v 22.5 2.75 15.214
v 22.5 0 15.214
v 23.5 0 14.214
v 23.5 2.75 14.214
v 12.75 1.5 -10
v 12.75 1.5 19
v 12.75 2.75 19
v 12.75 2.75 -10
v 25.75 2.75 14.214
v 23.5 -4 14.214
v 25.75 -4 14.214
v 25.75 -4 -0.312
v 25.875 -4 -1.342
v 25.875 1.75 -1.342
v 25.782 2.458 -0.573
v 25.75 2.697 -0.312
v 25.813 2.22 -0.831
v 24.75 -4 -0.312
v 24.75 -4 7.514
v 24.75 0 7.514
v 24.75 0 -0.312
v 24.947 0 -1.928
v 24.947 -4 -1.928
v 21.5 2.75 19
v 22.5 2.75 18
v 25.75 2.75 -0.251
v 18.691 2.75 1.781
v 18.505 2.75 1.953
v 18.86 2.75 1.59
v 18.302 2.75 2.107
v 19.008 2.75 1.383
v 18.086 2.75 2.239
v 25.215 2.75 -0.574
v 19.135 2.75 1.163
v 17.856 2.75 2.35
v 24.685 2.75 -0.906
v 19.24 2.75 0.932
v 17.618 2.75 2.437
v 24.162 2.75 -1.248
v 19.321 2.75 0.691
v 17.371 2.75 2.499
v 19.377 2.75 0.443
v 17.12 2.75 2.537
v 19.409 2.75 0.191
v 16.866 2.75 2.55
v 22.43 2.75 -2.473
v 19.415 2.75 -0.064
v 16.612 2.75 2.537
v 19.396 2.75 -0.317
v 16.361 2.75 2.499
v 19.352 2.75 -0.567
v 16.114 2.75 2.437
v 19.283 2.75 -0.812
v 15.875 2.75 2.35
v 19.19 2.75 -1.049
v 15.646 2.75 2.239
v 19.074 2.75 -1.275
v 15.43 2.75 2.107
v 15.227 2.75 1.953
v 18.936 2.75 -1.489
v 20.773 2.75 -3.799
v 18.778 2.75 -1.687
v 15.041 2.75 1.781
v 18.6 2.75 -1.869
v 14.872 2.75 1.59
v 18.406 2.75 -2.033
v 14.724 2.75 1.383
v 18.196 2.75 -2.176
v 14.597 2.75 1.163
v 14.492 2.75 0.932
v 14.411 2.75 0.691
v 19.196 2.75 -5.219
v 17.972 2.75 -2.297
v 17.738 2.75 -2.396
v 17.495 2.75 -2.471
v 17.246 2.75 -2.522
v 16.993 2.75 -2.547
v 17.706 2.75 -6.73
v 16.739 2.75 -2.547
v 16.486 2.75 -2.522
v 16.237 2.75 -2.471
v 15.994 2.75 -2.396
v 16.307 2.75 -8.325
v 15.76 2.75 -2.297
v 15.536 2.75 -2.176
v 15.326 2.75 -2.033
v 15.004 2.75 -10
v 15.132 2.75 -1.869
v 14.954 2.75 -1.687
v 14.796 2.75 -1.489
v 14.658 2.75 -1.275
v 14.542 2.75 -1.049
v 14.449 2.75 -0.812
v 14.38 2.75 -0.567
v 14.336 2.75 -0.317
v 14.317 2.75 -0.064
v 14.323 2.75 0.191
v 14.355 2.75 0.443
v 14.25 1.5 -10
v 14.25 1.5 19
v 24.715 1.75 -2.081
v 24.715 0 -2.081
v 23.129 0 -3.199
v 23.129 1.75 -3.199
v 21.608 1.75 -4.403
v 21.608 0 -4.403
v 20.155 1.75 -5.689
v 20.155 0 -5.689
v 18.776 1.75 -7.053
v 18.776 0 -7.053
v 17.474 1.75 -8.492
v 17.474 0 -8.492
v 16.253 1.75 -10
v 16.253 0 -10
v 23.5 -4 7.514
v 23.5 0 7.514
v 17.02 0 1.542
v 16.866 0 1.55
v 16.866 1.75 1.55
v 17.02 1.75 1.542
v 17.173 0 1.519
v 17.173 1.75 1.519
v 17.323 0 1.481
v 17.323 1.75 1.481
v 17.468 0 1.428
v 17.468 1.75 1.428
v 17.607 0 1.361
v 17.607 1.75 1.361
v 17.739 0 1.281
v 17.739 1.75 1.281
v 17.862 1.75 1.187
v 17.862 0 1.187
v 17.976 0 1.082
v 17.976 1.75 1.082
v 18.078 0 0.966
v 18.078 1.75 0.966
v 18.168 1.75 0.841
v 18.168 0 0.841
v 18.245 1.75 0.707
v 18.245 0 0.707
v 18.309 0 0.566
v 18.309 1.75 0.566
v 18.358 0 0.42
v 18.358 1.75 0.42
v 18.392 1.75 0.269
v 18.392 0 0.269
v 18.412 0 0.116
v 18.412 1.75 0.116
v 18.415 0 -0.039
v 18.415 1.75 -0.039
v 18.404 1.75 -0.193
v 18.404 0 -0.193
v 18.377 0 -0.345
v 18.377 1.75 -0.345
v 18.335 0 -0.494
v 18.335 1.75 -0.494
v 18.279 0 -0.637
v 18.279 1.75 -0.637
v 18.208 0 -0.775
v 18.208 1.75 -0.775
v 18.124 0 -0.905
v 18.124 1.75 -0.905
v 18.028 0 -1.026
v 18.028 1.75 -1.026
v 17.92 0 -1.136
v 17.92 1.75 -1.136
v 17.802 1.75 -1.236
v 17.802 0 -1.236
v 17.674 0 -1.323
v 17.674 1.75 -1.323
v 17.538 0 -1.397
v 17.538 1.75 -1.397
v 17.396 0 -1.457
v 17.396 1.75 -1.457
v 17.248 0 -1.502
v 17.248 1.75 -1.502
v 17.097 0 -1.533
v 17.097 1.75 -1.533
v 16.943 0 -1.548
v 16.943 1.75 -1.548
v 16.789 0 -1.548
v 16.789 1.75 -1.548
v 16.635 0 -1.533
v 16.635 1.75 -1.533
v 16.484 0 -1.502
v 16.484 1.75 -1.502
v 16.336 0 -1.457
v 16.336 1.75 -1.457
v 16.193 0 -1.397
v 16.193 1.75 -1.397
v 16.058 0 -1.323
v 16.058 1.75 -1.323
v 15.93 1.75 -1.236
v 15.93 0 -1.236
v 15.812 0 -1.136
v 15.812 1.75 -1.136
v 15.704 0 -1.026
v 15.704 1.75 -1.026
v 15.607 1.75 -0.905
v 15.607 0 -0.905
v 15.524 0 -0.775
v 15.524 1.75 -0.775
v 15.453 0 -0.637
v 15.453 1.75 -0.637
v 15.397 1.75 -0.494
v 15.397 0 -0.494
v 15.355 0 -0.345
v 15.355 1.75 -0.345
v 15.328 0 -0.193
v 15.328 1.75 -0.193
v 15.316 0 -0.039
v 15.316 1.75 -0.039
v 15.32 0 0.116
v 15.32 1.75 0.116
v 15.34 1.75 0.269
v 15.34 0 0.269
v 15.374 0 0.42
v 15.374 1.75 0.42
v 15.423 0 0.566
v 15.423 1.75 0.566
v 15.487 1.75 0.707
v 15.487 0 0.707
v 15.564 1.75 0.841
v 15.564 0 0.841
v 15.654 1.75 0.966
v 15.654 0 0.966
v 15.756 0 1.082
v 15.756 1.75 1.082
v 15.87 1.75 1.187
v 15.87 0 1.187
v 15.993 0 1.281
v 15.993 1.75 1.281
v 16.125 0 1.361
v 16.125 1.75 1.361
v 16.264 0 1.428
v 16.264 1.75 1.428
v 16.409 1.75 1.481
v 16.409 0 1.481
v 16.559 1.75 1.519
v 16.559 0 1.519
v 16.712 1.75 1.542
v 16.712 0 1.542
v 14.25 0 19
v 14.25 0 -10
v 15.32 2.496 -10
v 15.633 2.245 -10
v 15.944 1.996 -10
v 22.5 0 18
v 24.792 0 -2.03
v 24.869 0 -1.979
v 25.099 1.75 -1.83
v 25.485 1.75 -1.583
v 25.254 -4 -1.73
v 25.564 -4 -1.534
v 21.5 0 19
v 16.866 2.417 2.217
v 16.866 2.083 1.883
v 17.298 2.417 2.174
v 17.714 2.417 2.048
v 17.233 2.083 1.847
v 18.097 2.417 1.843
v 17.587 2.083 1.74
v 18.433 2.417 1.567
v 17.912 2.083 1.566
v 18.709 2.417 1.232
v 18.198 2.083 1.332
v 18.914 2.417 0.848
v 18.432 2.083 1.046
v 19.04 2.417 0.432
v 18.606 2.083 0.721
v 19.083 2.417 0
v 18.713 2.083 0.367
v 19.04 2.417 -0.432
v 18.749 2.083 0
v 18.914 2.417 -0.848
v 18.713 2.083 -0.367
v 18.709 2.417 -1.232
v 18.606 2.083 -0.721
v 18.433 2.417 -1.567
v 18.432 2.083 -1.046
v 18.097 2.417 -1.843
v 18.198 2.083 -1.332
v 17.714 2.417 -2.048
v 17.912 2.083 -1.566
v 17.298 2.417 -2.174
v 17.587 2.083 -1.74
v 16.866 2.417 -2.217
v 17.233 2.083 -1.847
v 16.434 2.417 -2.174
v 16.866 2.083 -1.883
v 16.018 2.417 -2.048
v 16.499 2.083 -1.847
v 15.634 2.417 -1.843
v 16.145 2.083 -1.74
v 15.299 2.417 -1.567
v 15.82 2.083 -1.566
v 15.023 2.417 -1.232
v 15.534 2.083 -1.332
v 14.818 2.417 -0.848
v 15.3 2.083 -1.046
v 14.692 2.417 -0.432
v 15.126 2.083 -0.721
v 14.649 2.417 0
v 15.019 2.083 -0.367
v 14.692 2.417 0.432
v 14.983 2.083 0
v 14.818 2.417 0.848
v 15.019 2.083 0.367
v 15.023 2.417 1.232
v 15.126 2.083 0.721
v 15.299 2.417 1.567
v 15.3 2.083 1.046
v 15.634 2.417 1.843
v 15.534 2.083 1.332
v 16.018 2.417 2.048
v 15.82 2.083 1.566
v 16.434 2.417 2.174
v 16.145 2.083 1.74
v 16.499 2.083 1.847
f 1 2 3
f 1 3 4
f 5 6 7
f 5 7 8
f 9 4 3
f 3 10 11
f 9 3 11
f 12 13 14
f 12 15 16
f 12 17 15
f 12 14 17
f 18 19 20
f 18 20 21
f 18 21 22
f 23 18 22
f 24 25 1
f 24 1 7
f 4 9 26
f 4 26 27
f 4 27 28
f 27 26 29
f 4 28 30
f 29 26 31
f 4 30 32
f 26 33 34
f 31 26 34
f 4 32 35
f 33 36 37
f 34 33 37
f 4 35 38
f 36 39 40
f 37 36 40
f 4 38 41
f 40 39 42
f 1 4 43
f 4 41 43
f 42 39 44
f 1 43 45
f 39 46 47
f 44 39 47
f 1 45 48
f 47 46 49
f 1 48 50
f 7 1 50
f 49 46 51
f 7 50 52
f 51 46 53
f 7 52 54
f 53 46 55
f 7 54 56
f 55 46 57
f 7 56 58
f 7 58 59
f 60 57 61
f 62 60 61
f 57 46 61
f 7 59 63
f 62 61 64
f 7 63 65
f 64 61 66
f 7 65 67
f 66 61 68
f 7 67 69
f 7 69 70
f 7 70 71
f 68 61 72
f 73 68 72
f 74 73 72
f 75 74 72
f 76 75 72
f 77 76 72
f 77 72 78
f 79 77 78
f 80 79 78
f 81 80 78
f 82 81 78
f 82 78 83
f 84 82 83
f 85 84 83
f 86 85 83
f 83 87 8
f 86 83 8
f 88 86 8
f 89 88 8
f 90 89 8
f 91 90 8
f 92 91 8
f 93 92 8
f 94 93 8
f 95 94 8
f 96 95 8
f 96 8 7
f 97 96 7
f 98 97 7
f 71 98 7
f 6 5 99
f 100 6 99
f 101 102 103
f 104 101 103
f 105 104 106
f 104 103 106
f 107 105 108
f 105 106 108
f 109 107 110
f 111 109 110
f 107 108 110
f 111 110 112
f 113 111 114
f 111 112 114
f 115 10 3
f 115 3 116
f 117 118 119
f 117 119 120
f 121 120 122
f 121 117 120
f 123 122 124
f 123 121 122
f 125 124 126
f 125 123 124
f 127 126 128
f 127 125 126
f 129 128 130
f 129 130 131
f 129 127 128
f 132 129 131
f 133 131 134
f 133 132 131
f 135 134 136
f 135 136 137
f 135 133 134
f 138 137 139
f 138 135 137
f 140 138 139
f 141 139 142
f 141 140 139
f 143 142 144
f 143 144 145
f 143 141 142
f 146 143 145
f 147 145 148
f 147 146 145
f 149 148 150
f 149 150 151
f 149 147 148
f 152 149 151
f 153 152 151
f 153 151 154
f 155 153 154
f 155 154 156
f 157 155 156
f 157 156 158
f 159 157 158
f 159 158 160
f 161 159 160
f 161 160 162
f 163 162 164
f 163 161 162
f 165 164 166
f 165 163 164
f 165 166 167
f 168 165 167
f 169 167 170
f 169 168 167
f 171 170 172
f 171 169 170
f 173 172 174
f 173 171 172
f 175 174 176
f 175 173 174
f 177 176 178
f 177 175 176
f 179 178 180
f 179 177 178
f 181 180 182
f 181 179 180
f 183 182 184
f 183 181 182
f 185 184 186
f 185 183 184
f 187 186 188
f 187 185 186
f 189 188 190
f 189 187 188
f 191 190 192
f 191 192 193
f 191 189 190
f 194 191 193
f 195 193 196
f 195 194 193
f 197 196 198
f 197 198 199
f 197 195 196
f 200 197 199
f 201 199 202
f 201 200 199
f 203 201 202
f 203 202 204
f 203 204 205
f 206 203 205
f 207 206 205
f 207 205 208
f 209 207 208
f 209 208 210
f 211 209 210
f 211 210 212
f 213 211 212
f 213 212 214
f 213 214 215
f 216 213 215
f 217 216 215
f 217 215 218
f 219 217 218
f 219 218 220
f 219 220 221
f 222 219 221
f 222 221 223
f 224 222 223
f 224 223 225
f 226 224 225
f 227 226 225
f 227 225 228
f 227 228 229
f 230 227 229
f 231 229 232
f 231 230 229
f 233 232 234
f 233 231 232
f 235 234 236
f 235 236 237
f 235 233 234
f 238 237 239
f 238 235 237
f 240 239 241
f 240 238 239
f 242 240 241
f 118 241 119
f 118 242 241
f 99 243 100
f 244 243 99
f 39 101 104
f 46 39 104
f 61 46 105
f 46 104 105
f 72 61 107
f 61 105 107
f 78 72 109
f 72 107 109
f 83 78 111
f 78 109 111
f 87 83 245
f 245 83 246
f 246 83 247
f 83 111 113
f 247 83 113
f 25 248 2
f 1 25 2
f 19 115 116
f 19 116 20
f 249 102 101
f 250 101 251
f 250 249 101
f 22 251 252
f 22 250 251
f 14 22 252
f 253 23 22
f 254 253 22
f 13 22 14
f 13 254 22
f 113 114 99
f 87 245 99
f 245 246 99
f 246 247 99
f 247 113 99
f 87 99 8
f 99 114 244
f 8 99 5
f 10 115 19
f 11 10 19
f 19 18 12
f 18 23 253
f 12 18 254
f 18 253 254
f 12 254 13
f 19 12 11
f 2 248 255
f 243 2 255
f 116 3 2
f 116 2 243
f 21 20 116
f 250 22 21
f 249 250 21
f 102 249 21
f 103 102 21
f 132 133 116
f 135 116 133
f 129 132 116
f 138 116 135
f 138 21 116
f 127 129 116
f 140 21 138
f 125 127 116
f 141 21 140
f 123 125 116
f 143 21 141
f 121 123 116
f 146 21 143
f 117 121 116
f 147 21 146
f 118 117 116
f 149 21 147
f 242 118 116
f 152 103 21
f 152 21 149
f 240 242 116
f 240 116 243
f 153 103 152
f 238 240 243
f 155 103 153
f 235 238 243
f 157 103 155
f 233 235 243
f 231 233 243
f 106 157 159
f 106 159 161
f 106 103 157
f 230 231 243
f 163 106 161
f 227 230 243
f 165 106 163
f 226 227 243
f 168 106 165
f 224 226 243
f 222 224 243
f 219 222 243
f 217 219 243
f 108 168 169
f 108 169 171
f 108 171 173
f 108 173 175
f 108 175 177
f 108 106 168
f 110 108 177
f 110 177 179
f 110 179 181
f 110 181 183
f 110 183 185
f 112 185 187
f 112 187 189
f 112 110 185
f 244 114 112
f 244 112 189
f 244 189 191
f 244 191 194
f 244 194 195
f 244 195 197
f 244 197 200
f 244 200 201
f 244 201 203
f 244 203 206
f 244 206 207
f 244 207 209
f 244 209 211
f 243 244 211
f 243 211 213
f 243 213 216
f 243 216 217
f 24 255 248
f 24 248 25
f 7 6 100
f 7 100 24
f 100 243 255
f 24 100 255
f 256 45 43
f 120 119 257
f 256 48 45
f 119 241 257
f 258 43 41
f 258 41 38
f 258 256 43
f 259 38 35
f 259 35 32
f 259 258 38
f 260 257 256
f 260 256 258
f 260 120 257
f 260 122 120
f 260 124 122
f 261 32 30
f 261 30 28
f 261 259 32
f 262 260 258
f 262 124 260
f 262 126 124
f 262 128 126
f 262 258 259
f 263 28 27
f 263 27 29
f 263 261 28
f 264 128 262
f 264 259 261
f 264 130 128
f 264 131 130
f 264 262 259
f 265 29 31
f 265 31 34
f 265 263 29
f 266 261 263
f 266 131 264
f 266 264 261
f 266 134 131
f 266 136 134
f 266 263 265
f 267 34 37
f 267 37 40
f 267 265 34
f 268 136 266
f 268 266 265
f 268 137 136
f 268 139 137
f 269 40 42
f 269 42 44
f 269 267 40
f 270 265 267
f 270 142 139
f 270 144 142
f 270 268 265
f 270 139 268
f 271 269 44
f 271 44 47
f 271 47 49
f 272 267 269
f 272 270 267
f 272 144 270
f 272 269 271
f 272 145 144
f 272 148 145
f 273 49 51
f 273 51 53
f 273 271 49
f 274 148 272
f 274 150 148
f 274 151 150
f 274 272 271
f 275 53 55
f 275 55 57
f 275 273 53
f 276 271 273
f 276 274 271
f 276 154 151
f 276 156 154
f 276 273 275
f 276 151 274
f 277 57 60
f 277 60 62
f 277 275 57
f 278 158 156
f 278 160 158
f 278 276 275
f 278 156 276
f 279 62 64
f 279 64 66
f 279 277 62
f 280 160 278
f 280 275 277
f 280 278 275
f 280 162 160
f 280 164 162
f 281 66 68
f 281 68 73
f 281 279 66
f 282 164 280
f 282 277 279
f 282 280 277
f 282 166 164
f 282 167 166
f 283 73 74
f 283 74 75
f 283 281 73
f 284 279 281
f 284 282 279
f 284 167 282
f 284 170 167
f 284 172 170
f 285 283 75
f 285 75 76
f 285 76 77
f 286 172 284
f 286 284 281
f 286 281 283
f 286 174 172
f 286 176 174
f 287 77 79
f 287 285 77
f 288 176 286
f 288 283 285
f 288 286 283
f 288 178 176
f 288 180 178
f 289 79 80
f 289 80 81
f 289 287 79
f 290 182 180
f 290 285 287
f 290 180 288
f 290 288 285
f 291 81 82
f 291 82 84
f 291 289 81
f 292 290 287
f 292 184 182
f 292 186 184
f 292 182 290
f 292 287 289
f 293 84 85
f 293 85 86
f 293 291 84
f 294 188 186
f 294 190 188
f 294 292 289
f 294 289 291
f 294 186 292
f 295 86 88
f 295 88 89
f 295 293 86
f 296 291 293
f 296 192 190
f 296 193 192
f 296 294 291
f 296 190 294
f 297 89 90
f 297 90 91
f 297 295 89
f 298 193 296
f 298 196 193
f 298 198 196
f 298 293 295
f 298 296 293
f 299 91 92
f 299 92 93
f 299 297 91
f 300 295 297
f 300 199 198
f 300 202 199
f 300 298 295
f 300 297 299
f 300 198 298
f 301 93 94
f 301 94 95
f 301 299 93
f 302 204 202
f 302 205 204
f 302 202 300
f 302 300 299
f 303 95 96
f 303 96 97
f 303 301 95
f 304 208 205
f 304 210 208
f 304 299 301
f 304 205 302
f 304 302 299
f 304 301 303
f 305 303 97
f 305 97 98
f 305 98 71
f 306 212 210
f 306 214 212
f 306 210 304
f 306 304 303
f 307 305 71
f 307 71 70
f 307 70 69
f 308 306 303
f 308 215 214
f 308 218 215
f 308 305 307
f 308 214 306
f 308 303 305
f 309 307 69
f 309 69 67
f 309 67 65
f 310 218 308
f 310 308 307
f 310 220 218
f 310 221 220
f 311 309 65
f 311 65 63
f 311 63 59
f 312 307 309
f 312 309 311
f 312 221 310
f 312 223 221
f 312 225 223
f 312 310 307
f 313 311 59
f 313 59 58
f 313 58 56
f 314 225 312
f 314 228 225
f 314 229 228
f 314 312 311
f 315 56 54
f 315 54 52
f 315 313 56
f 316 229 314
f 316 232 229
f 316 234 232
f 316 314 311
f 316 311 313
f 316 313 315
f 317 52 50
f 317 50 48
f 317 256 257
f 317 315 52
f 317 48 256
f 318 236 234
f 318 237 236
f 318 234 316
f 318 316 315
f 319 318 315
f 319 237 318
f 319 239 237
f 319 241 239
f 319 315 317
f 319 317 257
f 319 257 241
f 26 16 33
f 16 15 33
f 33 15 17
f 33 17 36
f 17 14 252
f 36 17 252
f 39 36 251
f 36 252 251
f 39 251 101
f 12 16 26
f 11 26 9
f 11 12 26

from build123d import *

# Parameters (mm, degrees)
SKETCH_234_R           = 1.55
EXTRUDE_1_DEPTH        = 2.75
SKETCH_923_W           = 10.000000002
SKETCH_923_H           = 4.75
EXTRUDE_2_DEPTH        = 2.75
SKETCH_1070_W          = 1
SKETCH_1070_H          = 6.95
EXTRUDE_1769_DEPTH     = 2.75
PCB_START              = -4
SKETCH_6_W             = 1
SKETCH_6_H             = 6.95
PCB_DEPTH              = 4
SKETCH_4_W             = 1.75
SKETCH_4_H             = 28.99988509
CUT_EXTRUDE_2211_DEPTH = 1.5
SKETCH_5_W             = 0.25
SKETCH_5_H             = 28.99988509
CUT_EXTRUDE_2_DEPTH    = 33.350081892
CHAMFER_1_SIZE         = 1
CHAMFER_2_SIZE         = 1
CUT_EXTRUDE_4_DEPTH    = 4


with BuildPart() as part:
    # Sketch 234 → 底座-1 (new body)
    with BuildSketch(Plane(origin=(0, 0, 0), x_dir=(1, 0, 0), z_dir=(0, 1, 0))):
        with BuildLine():
            Line((22.500000002, -14.24988509), (22.500000002, -7.263629174))
            Line((22.500000002, -7.263629174), (24.500000002, -7.263629174))
            Line((24.500000002, -7.263629174), (24.500000002, 0.312480077))
            Line((24.500000002, 0.312480077), (24.715186194, 2.08073674))
            ThreePointArc((24.715186194, 2.08073674), (20.15501929, 5.688743466), (16.252981126, 10))
            Line((16.252981126, 10), (12.5, 10))
            Line((12.5, 10), (12.5, -14.24988509))
            Line((12.5, -14.24988509), (22.500000002, -14.24988509))
        make_face()
        with Locations(Location((16.865979255, 0, 0), (0, 0, 270))):
            Circle(SKETCH_234_R, mode=Mode.SUBTRACT)
    extrude(amount=EXTRUDE_1_DEPTH)

    # Sketch 923 → 底座-2 (add)
    with BuildSketch(Plane(origin=(0, 0, 0), x_dir=(1, 0, 0), z_dir=(0, 1, 0))):
        with Locations((17.500000001, -16.62488509)):
            Rectangle(SKETCH_923_W, SKETCH_923_H)
    extrude(amount=EXTRUDE_2_DEPTH)

    # Sketch 1070 → Extrude 1769 (add)
    with BuildSketch(Plane(origin=(0, 0, 0), x_dir=(1, 0, 0), z_dir=(0, 1, 0))):
        with BuildLine():
            ThreePointArc((24.715186194, 2.08073674), (25.291636518, 1.705823535), (25.875319612, 1.342273079))
            Line((25.875319612, 1.342273079), (25.750000002, 0.312480077))
            Line((25.750000002, 0.312480077), (25.750000002, -14.213629174))
            Line((25.750000002, -14.213629174), (24.500000002, -14.213629174))
            Line((24.500000002, -14.213629174), (24.500000002, -7.263629174))
            Line((24.500000002, -7.263629174), (24.500000002, 0.312480077))
            Line((24.500000002, 0.312480077), (24.715186194, 2.08073674))
        make_face()
        with Locations((24.000000002, -10.738629174)):
            Rectangle(SKETCH_1070_W, SKETCH_1070_H)
        with Locations((23.000000002, -10.738629174)):
            Rectangle(SKETCH_1070_W, SKETCH_1070_H)
    extrude(amount=EXTRUDE_1769_DEPTH)

    # Sketch 6 → 底座卡榫-注意PCB突出部分 (add)
    with BuildSketch(Plane(origin=(0, 0, 0), x_dir=(1, 0, 0), z_dir=(0, 1, 0)).offset(PCB_START)):
        with Locations((24.000000002, -10.738629174)):
            Rectangle(SKETCH_6_W, SKETCH_6_H)
        with BuildLine():
            ThreePointArc((24.715186194, 2.08073674), (25.291636518, 1.705823535), (25.875319612, 1.342273079))
            Line((25.875319612, 1.342273079), (25.750000002, 0.312480077))
            Line((25.750000002, 0.312480077), (25.750000002, -14.213629174))
            Line((25.750000002, -14.213629174), (24.500000002, -14.213629174))
            Line((24.500000002, -14.213629174), (24.500000002, -7.263629174))
            Line((24.500000002, -7.263629174), (24.500000002, 0.312480077))
            Line((24.500000002, 0.312480077), (24.715186194, 2.08073674))
        make_face()
    extrude(amount=PCB_DEPTH)

    # 草图4 → Cut-Extrude 2211 (cut)
    with BuildSketch(Plane(origin=(0, 0, 0), x_dir=(1, 0, 0), z_dir=(0, 1, 0))):
        with Locations((13.375, -4.499942545)):
            Rectangle(SKETCH_4_W, SKETCH_4_H)
    extrude(amount=CUT_EXTRUDE_2211_DEPTH, mode=Mode.SUBTRACT)

    # 草图5 → 配合切除-2 (cut, through all)
    with BuildSketch(Plane(origin=(0, 0, 0), x_dir=(1, 0, 0), z_dir=(0, 1, 0))):
        with Locations((12.625, -4.499942545)):
            Rectangle(SKETCH_5_W, SKETCH_5_H)
    extrude(amount=CUT_EXTRUDE_2_DEPTH, mode=Mode.SUBTRACT)

    # 倒角1
    chamfer_1_edges = [part.edges().sort_by_distance(p)[0] for p in [
        (22.500000002, 1.375, 18.99988509),
        (20.661675073, 2.75, -5.223818951),
        (22.500000002, 1.375, 14.213629174),
    ]]
    chamfer(chamfer_1_edges, length=CHAMFER_1_SIZE)

    # 倒角2
    chamfer_2_edges = [part.edges().sort_by_distance(p)[0] for p in [
        (16.865979255, 2.75, -1.55),
    ]]
    chamfer(chamfer_2_edges, length=CHAMFER_2_SIZE)

    # Sketch 6 2 → 切除-拉伸4 (cut)
    with BuildSketch(Plane.XZ.offset(4)):
        with BuildLine():
            Line((24.715186194, -2.08073674), (24.500000002, -0.312480077))
            Line((24.500000002, -0.312480077), (24.500000002, 7.263629174))
            Line((24.500000002, 7.263629174), (23.500000002, 7.263629174))
            Line((23.500000002, 7.263629174), (23.500000002, 7.513629174))
            Line((23.500000002, 7.513629174), (24.750000002, 7.513629174))
            Line((24.750000002, 7.513629174), (24.750000002, -0.312480077))
            Line((24.750000002, -0.312480077), (24.946632534, -1.928275128))
            ThreePointArc((24.946632534, -1.928275128), (24.830758909, -2.004277534), (24.715186194, -2.08073674))
        make_face()
    extrude(amount=-CUT_EXTRUDE_4_DEPTH, mode=Mode.SUBTRACT)


solid = part.part
